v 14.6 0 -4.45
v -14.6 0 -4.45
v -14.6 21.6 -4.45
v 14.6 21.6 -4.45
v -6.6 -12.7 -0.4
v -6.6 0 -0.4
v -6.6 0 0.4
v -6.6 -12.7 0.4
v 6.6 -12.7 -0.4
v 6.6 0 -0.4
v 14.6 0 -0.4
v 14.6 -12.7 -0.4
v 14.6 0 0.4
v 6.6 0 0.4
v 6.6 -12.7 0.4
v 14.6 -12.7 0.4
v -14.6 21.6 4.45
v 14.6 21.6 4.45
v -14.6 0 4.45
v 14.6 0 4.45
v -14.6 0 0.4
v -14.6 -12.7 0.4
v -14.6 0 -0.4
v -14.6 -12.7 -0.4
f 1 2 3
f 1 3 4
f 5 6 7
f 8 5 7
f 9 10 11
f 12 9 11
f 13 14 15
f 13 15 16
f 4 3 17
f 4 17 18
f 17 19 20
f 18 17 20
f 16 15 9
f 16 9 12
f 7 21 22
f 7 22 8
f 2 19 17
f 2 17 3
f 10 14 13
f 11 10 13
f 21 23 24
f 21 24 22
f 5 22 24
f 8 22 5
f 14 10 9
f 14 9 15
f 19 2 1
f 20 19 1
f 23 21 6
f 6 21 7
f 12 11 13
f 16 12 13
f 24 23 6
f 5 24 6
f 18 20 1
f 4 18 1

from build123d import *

# Parameters (mm, degrees)
SKETCH1_W             = 29.2
SKETCH1_H             = 8.9
BOSS_EXTRUDE1_DEPTH   = 21.6
SKETCH2_W             = 8
SKETCH2_H             = 0.8
BOSS_EXTRUDE2_DEPTH   = 12.7
BOSS_EXTRUDE2_2_DEPTH = 12.7


with BuildPart() as part:
    # Sketch1 → Boss-Extrude1 (new body)
    with BuildSketch(Plane(origin=(0, 0, 0), x_dir=(1, 0, 0), z_dir=(0, 1, 0))):
        Rectangle(SKETCH1_W, SKETCH1_H)
    extrude(amount=BOSS_EXTRUDE1_DEPTH)


with BuildPart() as body_2:
    # Sketch2 → Boss-Extrude2 (new body)
    with BuildSketch(Plane.XZ):
        with Locations((-10.6, 0)):
            Rectangle(SKETCH2_W, SKETCH2_H)
    extrude(amount=BOSS_EXTRUDE2_DEPTH)


with BuildPart() as body_3:
    # Sketch2 → Boss-Extrude2 2 (new body)
    with BuildSketch(Plane.XZ):
        with Locations((10.6, 0)):
            Rectangle(SKETCH2_W, SKETCH2_H)
    extrude(amount=BOSS_EXTRUDE2_2_DEPTH)


solid = Compound([part.part, body_2.part, body_3.part])
